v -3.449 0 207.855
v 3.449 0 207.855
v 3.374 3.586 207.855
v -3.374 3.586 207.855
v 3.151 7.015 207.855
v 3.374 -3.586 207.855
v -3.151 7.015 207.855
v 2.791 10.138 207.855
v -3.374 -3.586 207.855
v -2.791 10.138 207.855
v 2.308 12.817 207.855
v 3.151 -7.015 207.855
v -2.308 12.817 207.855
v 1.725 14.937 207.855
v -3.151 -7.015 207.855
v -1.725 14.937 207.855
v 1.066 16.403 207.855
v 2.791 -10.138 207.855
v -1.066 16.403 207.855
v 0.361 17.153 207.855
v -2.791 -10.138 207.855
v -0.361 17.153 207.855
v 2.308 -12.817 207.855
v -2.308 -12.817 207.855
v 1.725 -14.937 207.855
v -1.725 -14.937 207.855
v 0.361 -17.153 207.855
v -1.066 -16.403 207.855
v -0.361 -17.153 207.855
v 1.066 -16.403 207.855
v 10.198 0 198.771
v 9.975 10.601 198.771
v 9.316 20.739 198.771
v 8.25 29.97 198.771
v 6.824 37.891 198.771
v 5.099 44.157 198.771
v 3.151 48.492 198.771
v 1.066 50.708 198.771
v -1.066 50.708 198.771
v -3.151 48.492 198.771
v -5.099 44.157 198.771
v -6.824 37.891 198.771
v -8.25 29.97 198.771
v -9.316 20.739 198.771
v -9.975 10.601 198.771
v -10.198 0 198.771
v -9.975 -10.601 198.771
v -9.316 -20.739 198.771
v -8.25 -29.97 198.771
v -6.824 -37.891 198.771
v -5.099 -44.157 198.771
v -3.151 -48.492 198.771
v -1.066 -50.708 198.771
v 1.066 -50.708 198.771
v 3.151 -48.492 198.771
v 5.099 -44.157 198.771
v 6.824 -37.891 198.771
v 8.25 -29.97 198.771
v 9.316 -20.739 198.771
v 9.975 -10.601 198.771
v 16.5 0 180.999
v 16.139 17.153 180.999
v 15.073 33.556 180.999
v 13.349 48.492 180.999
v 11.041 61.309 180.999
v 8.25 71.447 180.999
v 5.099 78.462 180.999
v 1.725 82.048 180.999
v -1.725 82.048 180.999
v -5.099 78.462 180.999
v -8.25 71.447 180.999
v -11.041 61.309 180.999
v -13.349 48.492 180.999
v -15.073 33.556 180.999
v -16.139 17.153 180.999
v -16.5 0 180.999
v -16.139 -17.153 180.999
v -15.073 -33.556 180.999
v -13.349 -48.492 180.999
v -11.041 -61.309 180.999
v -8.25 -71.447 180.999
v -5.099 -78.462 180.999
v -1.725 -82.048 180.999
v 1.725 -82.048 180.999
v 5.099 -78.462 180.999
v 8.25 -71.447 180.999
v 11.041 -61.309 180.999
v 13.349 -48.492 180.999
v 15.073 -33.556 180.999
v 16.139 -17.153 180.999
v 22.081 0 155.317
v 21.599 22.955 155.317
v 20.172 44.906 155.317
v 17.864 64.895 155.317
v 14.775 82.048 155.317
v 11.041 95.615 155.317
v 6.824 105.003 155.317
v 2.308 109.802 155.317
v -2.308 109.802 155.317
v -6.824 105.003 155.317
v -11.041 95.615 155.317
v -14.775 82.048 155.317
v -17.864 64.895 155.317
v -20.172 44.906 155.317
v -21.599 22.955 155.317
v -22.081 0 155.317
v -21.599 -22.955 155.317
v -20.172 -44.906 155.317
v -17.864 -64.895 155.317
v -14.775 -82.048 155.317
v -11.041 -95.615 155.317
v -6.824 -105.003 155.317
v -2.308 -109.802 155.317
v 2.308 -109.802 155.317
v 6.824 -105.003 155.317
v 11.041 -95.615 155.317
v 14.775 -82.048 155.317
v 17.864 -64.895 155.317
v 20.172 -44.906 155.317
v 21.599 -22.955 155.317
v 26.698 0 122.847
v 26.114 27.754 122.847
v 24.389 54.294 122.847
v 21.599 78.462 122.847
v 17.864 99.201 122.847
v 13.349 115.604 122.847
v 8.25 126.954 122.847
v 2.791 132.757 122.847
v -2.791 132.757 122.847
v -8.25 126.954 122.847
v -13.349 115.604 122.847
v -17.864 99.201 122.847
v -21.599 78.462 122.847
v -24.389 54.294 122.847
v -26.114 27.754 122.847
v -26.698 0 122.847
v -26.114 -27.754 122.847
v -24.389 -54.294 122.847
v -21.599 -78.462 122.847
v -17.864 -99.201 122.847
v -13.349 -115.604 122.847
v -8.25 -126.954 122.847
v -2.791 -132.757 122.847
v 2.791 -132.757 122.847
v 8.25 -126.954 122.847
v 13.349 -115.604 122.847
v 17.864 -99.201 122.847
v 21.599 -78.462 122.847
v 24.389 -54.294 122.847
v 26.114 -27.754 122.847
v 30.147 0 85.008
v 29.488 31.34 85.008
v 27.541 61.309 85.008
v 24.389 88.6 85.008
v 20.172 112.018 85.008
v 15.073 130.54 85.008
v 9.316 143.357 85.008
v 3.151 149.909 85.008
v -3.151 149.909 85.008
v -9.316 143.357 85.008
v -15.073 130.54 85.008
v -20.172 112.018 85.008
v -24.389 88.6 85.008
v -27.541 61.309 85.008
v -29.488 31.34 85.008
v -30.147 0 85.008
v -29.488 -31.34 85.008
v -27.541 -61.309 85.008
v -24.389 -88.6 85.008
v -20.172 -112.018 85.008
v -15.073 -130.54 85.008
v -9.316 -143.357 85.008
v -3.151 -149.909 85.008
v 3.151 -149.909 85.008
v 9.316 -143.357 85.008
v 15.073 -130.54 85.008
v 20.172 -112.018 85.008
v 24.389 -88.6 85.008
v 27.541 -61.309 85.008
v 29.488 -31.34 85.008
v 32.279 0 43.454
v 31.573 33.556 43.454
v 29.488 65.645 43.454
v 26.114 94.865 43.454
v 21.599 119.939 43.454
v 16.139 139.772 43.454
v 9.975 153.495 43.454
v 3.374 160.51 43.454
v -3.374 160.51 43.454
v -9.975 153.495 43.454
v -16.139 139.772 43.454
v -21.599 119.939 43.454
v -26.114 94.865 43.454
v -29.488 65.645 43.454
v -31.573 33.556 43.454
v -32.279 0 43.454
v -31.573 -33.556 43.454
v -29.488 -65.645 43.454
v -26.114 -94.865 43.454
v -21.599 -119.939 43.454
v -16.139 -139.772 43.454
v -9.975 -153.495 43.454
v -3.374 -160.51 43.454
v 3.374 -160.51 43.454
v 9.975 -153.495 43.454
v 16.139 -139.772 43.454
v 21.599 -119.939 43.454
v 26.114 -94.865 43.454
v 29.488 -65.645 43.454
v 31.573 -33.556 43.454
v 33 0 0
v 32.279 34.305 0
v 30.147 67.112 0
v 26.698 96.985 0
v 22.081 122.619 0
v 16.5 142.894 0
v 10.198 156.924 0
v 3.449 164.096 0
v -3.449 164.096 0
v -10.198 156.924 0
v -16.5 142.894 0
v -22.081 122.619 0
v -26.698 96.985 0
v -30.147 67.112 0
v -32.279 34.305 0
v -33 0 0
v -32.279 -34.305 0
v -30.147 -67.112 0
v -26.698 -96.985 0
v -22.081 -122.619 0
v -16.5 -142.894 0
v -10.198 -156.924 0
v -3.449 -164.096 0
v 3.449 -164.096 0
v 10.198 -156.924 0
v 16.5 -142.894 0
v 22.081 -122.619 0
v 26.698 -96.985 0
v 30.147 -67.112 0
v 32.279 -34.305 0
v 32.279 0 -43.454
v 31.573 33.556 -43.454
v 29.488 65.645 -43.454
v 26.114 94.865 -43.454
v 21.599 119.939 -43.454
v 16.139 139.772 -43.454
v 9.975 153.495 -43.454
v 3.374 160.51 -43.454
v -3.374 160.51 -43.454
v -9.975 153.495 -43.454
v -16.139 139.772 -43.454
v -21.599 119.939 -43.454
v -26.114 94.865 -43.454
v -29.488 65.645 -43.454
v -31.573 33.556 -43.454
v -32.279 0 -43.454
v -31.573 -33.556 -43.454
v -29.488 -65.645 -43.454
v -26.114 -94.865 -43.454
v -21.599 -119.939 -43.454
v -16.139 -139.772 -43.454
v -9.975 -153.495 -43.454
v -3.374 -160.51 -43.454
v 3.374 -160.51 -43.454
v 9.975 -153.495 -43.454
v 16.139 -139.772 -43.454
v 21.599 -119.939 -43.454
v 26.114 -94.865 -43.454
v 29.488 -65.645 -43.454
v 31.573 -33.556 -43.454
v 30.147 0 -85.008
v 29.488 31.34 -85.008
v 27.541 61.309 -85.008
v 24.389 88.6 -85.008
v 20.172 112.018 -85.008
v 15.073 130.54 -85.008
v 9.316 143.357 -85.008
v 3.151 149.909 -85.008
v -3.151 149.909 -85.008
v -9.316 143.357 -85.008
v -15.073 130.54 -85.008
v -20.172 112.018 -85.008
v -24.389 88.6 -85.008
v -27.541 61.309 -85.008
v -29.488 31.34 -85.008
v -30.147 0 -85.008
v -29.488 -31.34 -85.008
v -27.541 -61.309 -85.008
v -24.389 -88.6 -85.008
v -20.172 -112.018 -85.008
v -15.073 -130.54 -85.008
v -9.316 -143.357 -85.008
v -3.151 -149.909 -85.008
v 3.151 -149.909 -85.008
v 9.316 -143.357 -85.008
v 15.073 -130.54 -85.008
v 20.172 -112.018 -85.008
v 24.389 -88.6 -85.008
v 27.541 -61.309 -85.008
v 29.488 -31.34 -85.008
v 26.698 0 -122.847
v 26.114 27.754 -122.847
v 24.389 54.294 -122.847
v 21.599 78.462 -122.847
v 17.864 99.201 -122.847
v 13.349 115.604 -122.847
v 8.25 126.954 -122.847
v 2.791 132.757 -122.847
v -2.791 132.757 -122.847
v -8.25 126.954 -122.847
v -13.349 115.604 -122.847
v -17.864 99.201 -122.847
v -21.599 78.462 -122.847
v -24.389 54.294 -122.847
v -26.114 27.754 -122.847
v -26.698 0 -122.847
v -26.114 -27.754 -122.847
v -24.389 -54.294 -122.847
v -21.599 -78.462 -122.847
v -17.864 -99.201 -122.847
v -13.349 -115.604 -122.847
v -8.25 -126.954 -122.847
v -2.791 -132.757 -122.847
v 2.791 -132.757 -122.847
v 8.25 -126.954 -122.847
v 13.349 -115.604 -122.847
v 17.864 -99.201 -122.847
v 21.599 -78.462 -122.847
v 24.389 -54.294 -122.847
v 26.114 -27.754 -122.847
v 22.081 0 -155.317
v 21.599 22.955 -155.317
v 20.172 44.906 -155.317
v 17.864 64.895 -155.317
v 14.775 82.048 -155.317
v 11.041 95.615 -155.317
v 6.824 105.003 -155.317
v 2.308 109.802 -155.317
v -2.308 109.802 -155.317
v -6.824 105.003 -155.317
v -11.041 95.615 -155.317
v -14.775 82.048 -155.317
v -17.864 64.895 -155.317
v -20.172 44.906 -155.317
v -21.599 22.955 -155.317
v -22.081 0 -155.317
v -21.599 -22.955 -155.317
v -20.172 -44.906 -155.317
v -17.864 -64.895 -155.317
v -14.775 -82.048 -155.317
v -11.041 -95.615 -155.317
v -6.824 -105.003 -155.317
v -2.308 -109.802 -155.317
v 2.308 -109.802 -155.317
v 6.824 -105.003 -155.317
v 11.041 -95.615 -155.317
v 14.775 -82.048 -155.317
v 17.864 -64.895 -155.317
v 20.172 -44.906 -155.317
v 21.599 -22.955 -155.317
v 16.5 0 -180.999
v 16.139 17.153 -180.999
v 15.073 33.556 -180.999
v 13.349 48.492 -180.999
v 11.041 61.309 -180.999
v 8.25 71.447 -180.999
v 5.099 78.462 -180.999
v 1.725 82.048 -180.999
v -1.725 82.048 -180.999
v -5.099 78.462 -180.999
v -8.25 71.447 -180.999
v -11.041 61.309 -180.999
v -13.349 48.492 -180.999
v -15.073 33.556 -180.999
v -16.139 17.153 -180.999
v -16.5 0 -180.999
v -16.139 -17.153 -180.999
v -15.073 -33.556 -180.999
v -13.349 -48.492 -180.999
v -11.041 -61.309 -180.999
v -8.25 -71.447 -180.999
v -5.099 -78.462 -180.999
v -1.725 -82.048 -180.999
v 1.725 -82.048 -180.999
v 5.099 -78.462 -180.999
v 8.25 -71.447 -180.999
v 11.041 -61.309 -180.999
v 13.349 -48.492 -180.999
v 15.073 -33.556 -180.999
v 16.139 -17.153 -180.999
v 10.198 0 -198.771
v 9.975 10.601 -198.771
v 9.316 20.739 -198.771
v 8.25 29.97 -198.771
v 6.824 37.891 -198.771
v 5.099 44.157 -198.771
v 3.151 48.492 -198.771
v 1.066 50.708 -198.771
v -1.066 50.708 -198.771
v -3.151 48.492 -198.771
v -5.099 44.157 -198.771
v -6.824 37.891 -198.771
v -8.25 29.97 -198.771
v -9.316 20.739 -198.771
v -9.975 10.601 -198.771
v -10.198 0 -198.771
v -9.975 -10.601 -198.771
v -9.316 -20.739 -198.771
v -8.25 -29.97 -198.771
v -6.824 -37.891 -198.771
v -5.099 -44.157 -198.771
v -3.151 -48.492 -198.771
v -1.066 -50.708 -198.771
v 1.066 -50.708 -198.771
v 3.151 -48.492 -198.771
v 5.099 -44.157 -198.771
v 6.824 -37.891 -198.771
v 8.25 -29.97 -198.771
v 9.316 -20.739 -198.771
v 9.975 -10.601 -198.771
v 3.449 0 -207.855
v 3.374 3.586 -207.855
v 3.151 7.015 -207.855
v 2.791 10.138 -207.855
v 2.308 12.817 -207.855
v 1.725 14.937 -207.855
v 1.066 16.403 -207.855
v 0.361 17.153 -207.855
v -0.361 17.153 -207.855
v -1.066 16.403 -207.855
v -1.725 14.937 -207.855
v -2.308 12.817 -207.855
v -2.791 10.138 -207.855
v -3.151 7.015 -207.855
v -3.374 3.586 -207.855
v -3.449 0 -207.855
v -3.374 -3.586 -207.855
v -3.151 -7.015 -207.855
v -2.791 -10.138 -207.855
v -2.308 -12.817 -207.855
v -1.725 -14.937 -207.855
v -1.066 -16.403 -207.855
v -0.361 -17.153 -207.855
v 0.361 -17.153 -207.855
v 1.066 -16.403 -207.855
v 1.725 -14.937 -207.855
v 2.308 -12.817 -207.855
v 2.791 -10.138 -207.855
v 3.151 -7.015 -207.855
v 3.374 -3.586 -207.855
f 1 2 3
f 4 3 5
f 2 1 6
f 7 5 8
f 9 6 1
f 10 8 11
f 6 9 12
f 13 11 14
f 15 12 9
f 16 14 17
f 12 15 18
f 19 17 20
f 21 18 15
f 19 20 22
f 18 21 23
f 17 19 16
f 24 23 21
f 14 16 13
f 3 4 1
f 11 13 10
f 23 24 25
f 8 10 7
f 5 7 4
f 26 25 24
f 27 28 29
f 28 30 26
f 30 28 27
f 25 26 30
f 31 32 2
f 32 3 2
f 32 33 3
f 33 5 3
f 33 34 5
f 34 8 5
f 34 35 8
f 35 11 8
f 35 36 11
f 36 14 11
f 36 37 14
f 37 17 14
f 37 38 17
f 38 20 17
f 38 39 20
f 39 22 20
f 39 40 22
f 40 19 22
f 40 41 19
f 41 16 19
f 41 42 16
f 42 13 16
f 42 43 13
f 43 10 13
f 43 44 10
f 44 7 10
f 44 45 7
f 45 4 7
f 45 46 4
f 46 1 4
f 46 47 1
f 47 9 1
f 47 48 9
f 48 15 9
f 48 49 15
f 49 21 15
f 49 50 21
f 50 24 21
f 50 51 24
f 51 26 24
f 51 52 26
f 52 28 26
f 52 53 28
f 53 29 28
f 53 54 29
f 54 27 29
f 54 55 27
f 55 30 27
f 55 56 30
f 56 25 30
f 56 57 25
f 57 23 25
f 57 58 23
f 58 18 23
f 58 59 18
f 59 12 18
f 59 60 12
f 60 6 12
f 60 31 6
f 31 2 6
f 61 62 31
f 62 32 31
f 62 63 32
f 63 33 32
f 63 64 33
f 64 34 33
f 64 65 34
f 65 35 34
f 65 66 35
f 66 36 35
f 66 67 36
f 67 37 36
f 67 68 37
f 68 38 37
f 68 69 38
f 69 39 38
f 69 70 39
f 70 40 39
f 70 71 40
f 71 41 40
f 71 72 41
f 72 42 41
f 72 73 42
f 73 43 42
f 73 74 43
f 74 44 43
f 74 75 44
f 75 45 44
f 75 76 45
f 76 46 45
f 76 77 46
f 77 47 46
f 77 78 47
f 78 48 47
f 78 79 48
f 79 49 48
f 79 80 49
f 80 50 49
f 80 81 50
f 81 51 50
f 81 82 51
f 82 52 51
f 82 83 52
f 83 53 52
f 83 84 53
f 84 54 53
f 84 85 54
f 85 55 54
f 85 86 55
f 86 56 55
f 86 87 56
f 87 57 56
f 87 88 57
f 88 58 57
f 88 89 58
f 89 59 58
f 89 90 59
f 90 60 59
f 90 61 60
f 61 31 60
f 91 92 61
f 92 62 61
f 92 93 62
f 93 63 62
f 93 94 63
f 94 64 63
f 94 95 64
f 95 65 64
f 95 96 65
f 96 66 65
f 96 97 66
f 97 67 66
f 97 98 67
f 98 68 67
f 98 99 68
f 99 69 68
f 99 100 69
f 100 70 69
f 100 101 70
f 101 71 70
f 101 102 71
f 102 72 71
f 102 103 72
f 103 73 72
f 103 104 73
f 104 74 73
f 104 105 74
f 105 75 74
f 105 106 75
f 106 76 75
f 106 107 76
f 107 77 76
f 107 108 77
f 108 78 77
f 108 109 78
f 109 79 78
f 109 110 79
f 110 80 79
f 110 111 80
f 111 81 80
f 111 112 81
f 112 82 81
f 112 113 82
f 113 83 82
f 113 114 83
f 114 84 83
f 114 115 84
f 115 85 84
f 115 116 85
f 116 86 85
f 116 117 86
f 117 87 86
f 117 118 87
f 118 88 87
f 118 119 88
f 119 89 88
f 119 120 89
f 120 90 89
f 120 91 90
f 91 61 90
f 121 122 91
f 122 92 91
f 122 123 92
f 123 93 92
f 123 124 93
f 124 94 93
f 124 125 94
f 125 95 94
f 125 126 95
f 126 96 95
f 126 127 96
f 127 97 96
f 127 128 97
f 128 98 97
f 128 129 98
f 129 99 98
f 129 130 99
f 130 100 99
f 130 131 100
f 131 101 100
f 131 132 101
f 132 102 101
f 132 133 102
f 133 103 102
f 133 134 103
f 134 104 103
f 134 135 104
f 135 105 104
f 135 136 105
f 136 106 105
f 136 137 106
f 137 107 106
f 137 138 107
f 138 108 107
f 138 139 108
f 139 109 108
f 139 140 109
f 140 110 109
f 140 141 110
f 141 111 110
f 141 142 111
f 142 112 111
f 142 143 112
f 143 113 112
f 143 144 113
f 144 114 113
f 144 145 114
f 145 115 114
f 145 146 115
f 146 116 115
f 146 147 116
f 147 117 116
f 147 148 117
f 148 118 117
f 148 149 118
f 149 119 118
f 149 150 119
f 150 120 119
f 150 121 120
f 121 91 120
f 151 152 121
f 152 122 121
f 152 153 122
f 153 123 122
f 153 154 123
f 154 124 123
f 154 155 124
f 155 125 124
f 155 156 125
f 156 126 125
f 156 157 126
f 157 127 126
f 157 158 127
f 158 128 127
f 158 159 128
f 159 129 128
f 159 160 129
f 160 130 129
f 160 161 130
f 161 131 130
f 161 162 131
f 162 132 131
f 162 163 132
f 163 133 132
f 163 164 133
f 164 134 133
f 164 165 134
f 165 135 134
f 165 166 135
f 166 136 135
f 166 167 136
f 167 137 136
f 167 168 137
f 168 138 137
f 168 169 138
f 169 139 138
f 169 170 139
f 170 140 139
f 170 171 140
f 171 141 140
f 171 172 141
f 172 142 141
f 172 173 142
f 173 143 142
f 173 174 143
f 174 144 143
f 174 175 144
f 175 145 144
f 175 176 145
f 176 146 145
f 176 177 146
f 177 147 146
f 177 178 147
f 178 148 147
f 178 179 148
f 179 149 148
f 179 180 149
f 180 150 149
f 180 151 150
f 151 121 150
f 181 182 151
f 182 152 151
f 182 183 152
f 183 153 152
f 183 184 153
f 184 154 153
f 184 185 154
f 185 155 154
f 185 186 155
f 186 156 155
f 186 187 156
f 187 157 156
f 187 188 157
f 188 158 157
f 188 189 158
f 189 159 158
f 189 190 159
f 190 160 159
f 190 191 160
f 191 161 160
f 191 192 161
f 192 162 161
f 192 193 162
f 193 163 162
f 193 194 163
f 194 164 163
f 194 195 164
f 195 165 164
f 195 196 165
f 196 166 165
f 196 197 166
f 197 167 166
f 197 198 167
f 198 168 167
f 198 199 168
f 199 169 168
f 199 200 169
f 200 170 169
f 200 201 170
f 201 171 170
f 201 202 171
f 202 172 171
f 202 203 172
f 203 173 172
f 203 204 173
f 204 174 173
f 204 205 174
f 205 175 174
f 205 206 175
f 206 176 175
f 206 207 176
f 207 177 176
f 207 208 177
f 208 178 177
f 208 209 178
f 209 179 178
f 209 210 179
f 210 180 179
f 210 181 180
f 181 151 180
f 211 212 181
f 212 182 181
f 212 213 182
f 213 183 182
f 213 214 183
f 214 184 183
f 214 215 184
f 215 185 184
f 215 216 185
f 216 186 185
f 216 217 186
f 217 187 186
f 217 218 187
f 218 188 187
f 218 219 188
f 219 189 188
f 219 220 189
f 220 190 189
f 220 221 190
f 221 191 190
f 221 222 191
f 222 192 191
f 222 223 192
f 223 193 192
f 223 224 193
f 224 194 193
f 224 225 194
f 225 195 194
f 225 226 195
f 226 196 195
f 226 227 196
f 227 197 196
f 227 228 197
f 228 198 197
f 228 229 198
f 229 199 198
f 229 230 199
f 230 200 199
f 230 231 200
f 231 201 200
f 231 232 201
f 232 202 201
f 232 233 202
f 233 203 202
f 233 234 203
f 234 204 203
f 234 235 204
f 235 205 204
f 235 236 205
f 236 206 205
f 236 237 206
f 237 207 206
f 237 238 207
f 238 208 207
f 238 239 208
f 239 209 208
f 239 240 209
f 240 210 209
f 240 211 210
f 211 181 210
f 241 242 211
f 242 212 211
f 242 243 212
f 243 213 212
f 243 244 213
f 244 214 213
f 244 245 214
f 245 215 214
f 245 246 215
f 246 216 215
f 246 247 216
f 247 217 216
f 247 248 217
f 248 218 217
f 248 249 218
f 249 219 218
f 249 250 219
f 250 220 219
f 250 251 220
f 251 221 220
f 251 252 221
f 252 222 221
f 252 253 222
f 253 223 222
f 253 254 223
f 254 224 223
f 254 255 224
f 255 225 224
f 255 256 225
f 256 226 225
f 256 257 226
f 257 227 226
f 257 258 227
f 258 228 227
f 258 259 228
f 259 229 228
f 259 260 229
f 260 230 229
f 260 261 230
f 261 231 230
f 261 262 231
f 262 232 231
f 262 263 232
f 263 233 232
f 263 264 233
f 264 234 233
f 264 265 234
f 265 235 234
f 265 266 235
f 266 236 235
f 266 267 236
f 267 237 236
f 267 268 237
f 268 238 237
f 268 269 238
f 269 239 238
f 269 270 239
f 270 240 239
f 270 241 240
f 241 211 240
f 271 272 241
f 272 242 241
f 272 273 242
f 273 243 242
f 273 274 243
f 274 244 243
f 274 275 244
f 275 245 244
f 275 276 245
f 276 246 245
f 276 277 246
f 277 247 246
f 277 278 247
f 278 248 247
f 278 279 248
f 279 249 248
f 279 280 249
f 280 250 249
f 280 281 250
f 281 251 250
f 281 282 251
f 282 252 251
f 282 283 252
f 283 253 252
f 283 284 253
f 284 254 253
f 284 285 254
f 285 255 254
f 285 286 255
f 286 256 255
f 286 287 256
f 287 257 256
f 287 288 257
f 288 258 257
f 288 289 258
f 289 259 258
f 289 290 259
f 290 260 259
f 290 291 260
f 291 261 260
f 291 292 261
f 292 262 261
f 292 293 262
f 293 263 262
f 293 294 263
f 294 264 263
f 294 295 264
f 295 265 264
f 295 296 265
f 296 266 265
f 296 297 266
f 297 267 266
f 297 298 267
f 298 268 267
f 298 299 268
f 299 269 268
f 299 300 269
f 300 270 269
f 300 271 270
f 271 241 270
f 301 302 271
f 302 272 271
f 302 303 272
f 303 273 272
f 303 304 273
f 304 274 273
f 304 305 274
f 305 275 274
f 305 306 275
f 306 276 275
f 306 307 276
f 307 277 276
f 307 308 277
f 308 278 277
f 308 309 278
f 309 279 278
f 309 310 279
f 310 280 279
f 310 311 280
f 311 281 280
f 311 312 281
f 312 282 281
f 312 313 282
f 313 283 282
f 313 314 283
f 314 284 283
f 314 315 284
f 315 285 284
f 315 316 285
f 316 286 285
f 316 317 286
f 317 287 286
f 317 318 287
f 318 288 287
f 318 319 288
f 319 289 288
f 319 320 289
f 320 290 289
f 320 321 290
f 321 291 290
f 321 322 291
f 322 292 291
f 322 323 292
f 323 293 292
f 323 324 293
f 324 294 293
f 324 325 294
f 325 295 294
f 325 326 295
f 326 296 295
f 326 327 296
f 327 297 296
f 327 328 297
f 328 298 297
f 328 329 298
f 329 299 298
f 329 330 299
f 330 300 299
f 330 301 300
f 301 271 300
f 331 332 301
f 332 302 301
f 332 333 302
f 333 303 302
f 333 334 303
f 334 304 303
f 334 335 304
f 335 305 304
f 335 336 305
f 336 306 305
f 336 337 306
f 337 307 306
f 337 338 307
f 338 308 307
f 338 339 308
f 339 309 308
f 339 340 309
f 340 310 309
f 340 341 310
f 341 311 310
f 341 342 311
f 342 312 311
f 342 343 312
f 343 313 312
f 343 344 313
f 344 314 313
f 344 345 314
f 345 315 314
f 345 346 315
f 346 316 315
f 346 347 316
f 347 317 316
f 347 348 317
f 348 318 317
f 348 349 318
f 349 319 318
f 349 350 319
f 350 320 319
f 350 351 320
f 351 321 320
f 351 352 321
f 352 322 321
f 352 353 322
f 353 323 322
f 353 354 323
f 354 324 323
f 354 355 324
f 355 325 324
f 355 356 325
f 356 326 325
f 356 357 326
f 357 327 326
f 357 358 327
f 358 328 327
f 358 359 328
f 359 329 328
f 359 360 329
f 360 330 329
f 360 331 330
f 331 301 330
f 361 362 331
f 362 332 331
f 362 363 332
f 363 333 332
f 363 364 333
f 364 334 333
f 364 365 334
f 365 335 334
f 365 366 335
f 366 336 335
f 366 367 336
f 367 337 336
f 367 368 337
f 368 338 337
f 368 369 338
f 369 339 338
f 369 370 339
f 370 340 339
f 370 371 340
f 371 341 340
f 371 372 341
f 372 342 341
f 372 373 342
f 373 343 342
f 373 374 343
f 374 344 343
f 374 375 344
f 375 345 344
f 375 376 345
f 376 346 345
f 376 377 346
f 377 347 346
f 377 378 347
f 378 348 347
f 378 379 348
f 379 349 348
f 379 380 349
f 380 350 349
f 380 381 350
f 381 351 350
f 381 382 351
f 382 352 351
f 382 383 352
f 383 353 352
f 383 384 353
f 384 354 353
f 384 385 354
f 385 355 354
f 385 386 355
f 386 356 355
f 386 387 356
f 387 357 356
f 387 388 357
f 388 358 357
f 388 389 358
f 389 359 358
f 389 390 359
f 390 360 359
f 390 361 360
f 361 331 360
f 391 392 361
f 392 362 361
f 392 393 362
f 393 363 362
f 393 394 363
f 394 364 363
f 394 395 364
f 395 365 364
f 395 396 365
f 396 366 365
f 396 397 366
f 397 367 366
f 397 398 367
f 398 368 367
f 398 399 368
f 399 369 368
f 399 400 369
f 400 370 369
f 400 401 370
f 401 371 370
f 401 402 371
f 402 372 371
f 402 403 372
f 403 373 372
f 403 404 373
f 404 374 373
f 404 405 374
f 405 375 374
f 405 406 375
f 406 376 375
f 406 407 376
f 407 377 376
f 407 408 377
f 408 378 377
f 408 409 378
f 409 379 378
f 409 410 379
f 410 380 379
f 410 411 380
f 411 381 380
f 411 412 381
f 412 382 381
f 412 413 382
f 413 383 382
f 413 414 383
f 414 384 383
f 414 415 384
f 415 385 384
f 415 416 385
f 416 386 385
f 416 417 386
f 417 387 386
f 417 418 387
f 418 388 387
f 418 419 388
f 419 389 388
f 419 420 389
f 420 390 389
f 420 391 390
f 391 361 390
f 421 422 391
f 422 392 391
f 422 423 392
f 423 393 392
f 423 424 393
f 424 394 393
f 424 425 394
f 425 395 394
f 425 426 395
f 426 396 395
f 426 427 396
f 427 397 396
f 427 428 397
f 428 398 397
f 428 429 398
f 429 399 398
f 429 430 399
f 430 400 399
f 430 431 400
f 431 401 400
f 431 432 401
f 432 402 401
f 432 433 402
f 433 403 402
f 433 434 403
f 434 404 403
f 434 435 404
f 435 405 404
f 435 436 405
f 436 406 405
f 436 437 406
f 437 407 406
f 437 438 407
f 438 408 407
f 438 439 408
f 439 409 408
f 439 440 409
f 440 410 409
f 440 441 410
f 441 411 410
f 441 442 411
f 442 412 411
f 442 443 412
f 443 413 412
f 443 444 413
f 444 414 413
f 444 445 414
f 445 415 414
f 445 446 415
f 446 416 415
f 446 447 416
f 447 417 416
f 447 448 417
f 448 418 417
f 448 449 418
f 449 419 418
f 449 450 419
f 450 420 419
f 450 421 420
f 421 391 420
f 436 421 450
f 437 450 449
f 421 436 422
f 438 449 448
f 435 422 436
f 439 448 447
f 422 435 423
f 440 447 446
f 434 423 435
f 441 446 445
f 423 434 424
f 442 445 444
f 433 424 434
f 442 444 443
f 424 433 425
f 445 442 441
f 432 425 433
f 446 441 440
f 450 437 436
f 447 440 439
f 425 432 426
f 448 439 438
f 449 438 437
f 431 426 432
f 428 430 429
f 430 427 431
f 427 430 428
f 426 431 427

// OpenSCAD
// Generated by SolidPython 1.0.1 on 2020-07-29 00:46:45


scale(v = [3, 15, 19]) {
	sphere(r = 11);
}
/***********************************************
*********      SolidPython code:      **********
************************************************
 
# import packages: SolidPython
from solid import *
from solid.utils import *
from itertools import chain, combinations, permutations


class Resize:

    def __init__(self, scad_file):
        self.scad_file = scad_file
        #self.scad_file = import_scad(scad_file)
        # cone/cylinder param:
        self.r1 = 0
        self.r2 = 0
        self.h = 0
        # rectangular prism param:
        self.w = 0
        self.l = 0
        # ellipse param:
        self.r = 0

    # import OpenScad code (file name corresponds to shape)


    # classify shape + parameters
    def assign(self, param1, param2, param3):
        if self.scad_file == 'cone.scad':
            self.r1 = param1
            self.r2 = param2
            self.h = param3
        elif self.scad_file == 'cylinder.scad':
            self.r1 = param1
            self.r2 = param2
            self.h = param3
        elif self.scad_file == 'rectangularPrism.scad':
            self.h = param1
            self.l = param2
            self.w = param3
        else:
            self.r = param1
            self.h = param2

    # resize parameters
    def iterate(self):
        x = range(3, 20, 2)
        i = 1
        if self.scad_file == 'cone.scad':
            tempList = list(permutations(x, 2))
            for temp in tempList:
                param1 = temp[0]
                param2 = temp[1]
                filepath = 'produced_scad_files/' + 'cone' + str(param1) + '_' + str(param2) + '_' + '.scad'
                scad_render_to_file(cylinder(h=param1, r1=param2, r2=0), filepath)

        elif self.scad_file == 'cylinder.scad':
            tempList = list(permutations(x, 3))
            for temp in tempList:
                param1 = temp[0]
                param2 = temp[1]
                filepath = 'produced_scad_files/' + 'cylinder' + str(param1) + '_' + str(param2) + '_' + '.scad'
                scad_render_to_file(cylinder(h=param1, r1=param2, r2=param2), filepath)

        elif self.scad_file == 'rectangularPrism.scad':
            tempList = list(permutations(x, 3))
            for temp in tempList:
                param1 = temp[0]
                param2 = temp[1]
                param3 = temp[2]
                filepath = 'produced_scad_files/' + 'rectangularPrism' + str(param1) + '_' + str(param2) + '_' + str(
                    param3) + '.scad'
                scad_render_to_file(cube(size=(param1, param2, param3)), filepath)

        elif self.scad_file == 'ellipse.scad':
            tempList = list(permutations(x, 4))
            for temp in tempList:
                param1 = temp[0]
                param2 = temp[1]
                param3 = temp[2]
                param4 = temp[3]
                filepath = 'produced_scad_files/' + 'ellipse' + str(param1) + '_' + str(param2) + '_' + str(param3) + '_' + str(param4) + '.scad'
                scad_render_to_file(scale([param1, param2, param3])(sphere(r=param4)), filepath)

    def render_to_scadfile(self):
        scad_render_to_file(scad, 'example.scad') 
 
************************************************/
